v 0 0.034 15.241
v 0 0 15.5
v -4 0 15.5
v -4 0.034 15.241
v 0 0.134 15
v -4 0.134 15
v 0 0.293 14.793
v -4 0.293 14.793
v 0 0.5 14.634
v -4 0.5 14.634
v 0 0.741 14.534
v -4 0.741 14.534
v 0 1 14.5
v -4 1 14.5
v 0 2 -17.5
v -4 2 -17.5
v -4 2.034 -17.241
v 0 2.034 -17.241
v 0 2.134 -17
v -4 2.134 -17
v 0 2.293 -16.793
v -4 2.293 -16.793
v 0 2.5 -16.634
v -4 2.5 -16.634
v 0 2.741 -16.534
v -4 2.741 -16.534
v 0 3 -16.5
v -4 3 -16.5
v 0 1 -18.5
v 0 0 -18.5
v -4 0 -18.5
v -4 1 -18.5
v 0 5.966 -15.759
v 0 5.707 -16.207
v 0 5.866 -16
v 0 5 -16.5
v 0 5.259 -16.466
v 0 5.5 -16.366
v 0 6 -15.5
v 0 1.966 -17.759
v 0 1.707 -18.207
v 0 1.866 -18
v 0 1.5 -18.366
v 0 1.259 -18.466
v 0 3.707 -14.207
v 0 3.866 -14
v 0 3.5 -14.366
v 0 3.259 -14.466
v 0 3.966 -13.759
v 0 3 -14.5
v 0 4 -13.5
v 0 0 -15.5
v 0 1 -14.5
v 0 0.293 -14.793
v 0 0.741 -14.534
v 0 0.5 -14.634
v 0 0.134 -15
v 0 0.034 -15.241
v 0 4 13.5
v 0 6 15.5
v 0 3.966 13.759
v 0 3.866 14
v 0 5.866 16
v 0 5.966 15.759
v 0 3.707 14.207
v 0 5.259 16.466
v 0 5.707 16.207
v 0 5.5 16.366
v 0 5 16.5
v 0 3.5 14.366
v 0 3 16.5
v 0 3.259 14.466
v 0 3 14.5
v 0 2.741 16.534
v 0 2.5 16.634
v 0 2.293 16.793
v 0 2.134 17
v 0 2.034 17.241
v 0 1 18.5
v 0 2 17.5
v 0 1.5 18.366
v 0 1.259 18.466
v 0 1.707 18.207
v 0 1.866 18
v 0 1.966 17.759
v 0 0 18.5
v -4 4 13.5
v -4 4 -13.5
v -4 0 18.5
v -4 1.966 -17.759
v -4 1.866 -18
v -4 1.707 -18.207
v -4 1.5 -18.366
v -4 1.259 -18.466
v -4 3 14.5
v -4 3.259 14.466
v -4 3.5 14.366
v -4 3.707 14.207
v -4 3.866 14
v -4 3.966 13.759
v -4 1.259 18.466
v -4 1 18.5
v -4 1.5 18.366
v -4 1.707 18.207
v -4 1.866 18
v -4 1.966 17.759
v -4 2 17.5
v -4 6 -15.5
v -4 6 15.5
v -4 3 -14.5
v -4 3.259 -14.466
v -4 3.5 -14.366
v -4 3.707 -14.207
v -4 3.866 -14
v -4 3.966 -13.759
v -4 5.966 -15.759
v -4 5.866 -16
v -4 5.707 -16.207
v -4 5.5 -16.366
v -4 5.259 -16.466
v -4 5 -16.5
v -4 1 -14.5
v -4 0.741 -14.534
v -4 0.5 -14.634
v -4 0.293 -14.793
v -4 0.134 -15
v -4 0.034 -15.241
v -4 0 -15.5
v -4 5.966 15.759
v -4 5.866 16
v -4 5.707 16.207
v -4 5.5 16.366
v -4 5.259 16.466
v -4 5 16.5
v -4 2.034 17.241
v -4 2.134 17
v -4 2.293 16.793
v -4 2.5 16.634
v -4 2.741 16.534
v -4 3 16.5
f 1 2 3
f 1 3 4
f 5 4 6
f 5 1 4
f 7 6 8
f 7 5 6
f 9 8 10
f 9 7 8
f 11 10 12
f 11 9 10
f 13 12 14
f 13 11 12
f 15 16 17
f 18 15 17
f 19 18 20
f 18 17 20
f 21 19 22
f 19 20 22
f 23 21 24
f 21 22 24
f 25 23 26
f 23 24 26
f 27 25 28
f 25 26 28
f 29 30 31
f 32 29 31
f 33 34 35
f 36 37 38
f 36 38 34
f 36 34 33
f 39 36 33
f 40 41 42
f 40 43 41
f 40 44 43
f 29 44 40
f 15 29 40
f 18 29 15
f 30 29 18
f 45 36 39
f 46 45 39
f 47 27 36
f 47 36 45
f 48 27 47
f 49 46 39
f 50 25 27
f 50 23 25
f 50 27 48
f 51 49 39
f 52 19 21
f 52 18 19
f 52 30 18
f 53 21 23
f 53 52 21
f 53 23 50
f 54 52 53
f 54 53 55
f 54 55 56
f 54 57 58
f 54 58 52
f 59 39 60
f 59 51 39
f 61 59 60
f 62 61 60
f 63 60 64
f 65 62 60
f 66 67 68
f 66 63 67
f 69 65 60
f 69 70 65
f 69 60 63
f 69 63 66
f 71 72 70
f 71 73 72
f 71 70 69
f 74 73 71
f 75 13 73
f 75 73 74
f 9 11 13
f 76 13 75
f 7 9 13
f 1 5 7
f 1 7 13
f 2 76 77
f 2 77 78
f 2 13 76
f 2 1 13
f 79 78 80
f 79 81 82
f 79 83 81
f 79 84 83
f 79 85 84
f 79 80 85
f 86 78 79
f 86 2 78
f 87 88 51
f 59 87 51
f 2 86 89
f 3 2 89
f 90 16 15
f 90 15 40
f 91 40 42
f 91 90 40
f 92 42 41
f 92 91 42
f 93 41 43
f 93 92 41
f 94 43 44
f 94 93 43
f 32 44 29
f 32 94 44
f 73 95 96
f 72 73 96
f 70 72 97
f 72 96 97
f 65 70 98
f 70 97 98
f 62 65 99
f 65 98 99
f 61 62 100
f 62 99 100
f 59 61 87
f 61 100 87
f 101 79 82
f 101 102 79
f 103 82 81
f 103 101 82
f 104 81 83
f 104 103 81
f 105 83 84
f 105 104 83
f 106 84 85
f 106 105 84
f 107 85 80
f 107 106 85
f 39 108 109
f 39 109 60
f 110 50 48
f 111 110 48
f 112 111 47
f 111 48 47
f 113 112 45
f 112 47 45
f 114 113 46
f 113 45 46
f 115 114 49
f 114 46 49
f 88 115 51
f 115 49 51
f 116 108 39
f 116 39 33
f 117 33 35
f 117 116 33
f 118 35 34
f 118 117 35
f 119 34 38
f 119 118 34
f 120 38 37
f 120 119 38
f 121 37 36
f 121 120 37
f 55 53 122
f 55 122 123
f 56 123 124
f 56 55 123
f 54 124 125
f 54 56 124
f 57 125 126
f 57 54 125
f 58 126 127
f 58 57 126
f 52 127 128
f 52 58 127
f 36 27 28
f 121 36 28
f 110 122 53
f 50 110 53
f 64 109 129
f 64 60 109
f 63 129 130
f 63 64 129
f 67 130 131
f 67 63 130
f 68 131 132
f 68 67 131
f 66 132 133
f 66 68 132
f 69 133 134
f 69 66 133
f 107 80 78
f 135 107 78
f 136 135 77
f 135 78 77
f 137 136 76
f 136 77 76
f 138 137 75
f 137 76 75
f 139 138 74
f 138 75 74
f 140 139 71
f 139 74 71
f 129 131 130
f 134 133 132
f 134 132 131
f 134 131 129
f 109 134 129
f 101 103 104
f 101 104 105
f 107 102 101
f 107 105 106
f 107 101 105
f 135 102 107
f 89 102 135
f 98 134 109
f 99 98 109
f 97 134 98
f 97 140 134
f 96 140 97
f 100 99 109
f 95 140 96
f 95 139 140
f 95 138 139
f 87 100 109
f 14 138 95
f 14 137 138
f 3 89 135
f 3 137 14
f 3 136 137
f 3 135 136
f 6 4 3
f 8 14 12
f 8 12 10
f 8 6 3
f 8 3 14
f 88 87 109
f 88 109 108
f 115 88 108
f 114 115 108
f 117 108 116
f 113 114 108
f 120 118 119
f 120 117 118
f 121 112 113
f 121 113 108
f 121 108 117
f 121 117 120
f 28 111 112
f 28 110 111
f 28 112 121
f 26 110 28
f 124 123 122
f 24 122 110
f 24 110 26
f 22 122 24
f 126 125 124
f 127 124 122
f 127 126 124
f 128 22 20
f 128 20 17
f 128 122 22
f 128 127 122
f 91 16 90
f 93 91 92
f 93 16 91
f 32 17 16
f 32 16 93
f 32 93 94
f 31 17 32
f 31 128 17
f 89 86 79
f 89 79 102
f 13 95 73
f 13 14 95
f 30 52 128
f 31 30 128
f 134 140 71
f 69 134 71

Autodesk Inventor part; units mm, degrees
ref_plane "YZ Plane" through (0, 0, 0) normal (1, 0, 0) x (0, 1, 0)
ref_plane "XZ Plane" through (0, 0, 0) normal (0, 1, 0) x (-1, 0, 0)
ref_plane "XY Plane" through (0, 0, 0) normal (0, 0, 1) x (1, 0, 0)
sketch "Sketch1" plane through (0, 0, 0) normal (0, 1, 0) x (-1, 0, 0)
  line L0 (0, 18.5) -> (4, 18.5)
  line L1 (4, 18.5) -> (4, 14.5)
  line L2 (4, 14.5) -> (0, 14.5)
  line L3 (0, 14.5) -> (0, 18.5)
  line L4 (4, -14.5) -> (0, -14.5)
  line L5 (0, -14.5) -> (0, -18.5)
  line L6 (0, -18.5) -> (4, -18.5)
  line L7 (4, -18.5) -> (4, -14.5)
  line L8 (4, 14.5) -> (4, -14.5) construction
  point P0 (0, 0)
  point P1 (4, 0)
  dimension "d0" = 37
  dimension "d1" = 4
extrude "Extrusion1" add sketch "Sketch1" along normal blind 2
sketch "Sketch2" plane through (0, 2, 0) normal (0, 1, 0) x (1, 0, 0)
  line L0 (-4, -14.5) -> (-4, -18.5) projected
  line L1 (0, 14.5) -> (0, 18.5) projected
  line L2 (-4, -16.5) -> (0, -16.5)
  line L3 (0, -16.5) -> (0, 16.5)
  line L4 (0, 16.5) -> (-4, 16.5)
  line L5 (-4, 16.5) -> (-4, -16.5)
  line L6 (0, -14.5) -> (-4, -14.5) projected
  line L7 (-4, 14.5) -> (0, 14.5) projected
  point P0 (0, 0)
  dimension "d4" = 2
  dimension "d5" = 2
extrude "Extrusion2" add sketch "Sketch2" along normal blind 2 contours L6 L3 L2 L0 | L5 L4 L1 L7
sketch "Sketch3" plane through (0, 4, 0) normal (0, 1, 0) x (1, 0, 0)
  line L0 (-4, -16.5) -> (0, -16.5) projected
  line L1 (0, 16.5) -> (-4, 16.5) projected
  line L2 (0, -16.5) -> (-4, -16.5)
  line L3 (-4, -16.5) -> (-4, 16.5)
  line L4 (-4, 16.5) -> (0, 16.5)
  line L5 (0, 16.5) -> (0, -16.5)
  point P0 (0, 0)
extrude "Extrusion3" add sketch "Sketch3" along normal blind 2
fillet "Fillet3" radius 1 9 edges at (-2, 2, 16.5) (-2, 2, 18.5) (-2, 2, -16.5) (-2, 0, 14.5) (-2, 0, -14.5) (-2, 4, -14.5) (-2, 4, 14.5) (-2, 6, -16.5) (-2, 6, 16.5)
fillet "Fillet4" radius 1 1 edges at (-2, 2, -18.5)
properties part number "screen_support"
